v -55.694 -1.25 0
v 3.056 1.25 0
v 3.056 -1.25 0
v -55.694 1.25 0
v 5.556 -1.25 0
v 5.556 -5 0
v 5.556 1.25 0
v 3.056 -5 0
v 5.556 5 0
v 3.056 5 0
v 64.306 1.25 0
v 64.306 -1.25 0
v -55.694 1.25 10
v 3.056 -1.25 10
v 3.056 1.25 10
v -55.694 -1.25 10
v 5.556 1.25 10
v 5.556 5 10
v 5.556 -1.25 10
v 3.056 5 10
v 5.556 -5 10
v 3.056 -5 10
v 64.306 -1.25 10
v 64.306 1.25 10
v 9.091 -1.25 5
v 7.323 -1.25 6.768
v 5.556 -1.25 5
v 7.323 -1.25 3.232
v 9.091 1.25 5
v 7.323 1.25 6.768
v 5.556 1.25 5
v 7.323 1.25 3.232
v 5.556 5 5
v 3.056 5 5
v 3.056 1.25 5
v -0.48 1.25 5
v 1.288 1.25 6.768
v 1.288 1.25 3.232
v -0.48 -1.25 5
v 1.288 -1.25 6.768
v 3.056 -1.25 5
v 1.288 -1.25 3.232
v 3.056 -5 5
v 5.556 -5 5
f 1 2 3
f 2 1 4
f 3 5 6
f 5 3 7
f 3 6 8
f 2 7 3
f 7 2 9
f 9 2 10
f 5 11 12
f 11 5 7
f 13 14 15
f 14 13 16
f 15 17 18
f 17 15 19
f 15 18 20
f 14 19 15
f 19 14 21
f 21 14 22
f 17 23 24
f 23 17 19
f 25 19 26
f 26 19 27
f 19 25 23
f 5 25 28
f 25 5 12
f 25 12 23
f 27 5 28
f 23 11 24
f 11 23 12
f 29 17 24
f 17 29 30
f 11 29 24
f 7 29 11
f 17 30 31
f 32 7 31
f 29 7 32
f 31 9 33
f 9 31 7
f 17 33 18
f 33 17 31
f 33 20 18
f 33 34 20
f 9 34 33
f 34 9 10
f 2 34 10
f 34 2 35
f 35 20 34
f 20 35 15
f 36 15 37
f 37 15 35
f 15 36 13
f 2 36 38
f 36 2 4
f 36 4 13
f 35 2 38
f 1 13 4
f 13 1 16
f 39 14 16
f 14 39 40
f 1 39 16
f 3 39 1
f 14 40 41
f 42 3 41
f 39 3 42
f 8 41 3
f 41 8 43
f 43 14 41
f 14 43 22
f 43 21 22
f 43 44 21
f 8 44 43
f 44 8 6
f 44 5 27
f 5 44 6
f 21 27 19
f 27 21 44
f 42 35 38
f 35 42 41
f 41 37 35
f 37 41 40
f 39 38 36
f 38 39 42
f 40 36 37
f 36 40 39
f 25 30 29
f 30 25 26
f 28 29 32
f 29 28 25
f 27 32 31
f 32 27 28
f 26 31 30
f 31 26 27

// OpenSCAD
use <common.scad>

BIG = 1000;
EPS = 1e-100;

SHAFT_D = 10;
SHAFT_L = 50;
WALL_T = 2.5;
ENDSTOP_SIZE = SHAFT_D/9;
SPINDLE_D = SHAFT_D/4;
STOPPER_T = SPINDLE_D;
TUBE_D = 5;

HEIGHT = SHAFT_D;

module piston() {
  difference() {
    union() {
      channel([0,0],[SHAFT_L,0],d=SHAFT_D,cap="square");
      channel([0,-BIG],[0,0],d=TUBE_D,cap="square");
      channel([SHAFT_L,-BIG],[SHAFT_L,0],d=TUBE_D,cap="square");
      channel([-BIG,0],[BIG,0],d=SPINDLE_D);
    }
    channel([TUBE_D/2+ENDSTOP_SIZE/2,-SHAFT_D/2],[TUBE_D/2+ENDSTOP_SIZE/2,-SHAFT_D/2+ENDSTOP_SIZE],d=ENDSTOP_SIZE,cap="none");
    channel([SHAFT_L-TUBE_D/2-ENDSTOP_SIZE/2,-SHAFT_D/2],[SHAFT_L-TUBE_D/2-ENDSTOP_SIZE/2,-SHAFT_D/2+ENDSTOP_SIZE],d=ENDSTOP_SIZE,cap="none");
  }
}

* intersection() { // Body
  difference() {
    minkowski() {
      linear_extrude(height=HEIGHT) piston();
      translate([0,0,-WALL_T/2]) cube(WALL_T,center=true);
    }
    linear_extrude(height=HEIGHT) piston();
  }
  linear_extrude(height=BIG,center=true) translate([-SHAFT_L*0.2,-SHAFT_D*1.5]) square([SHAFT_L*1.4, SHAFT_D*2.5]);
  * translate([0,0,-BIG/2]) cube([BIG,BIG,BIG],center=true);
}

// Piston
translate([TUBE_D/2+ENDSTOP_SIZE/2+STOPPER_T/2,0,0]) difference() {
  linear_extrude(height=HEIGHT) {
    channel([-SHAFT_L*1.2,0],[SHAFT_L*1.2,0],d=SPINDLE_D);
    channel([0,-SHAFT_D/2],[0,SHAFT_D/2],d=STOPPER_T);
  }
  translate([-STOPPER_T/2-SPINDLE_D*sqrt(1/2),0,HEIGHT/2]) rotate([0,45,0]) cube([SPINDLE_D,BIG,SPINDLE_D],center=true);
  translate([STOPPER_T/2+SPINDLE_D*sqrt(1/2),0,HEIGHT/2]) rotate([0,45,0]) cube([SPINDLE_D,BIG,SPINDLE_D],center=true);
}
